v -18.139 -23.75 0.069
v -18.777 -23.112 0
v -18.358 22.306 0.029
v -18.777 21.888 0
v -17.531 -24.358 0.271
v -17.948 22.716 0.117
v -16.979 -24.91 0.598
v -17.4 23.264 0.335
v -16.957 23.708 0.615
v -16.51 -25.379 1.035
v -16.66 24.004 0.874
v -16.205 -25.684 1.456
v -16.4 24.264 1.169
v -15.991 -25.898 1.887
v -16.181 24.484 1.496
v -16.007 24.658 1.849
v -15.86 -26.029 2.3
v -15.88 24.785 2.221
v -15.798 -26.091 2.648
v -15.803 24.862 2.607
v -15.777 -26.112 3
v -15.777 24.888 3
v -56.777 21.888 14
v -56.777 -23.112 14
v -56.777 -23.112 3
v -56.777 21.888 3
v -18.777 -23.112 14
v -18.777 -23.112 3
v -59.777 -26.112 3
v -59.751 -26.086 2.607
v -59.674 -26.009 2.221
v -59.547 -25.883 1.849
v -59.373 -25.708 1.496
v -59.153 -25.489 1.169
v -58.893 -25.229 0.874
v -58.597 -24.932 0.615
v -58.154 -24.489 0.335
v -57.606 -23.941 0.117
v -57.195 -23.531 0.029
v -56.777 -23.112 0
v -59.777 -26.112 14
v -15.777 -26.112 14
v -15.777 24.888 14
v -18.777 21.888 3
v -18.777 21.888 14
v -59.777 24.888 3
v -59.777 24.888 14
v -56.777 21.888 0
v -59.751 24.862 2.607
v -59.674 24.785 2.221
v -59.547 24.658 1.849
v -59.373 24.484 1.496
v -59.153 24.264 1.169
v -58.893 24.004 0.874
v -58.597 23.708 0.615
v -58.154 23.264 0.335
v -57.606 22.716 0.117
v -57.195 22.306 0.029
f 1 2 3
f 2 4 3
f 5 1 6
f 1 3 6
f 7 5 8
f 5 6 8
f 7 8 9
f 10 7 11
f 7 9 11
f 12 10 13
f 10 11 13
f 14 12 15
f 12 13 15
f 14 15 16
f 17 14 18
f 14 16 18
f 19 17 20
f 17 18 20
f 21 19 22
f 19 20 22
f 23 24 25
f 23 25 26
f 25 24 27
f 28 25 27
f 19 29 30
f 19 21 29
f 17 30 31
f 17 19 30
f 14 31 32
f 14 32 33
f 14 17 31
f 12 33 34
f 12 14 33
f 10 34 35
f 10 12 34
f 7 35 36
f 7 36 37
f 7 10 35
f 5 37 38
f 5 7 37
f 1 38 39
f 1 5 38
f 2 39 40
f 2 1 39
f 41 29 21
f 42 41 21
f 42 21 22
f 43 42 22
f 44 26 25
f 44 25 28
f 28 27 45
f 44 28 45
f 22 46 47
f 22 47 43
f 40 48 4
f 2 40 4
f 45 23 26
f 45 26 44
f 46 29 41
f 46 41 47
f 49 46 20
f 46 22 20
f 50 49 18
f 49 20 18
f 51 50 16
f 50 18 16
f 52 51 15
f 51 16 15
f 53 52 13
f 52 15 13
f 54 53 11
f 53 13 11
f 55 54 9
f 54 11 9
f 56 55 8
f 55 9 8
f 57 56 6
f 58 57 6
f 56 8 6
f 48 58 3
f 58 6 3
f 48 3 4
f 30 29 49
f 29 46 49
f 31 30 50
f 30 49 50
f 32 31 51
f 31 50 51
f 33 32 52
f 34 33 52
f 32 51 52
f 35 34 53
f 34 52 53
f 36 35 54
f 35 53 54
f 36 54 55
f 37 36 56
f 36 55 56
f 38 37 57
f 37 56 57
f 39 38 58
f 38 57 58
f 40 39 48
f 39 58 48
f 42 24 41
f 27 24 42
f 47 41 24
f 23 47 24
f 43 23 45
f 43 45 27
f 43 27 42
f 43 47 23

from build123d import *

# Parameters (mm, degrees)
SKETCH_1_W          = 44
SKETCH_1_H          = 51
EXTRUDE_2_DEPTH     = 14
SKETCH_2_W          = 38
SKETCH_2_H          = 45
CUT_EXTRUDE_1_DEPTH = 11
FILLET_1_R          = 3


with BuildPart() as part:
    # 草圖1 → 填料-伸長2 (new body)
    with BuildSketch(Plane.XY):
        with Locations((-37.776876722, -0.612244898)):
            Rectangle(SKETCH_1_W, SKETCH_1_H)
    extrude(amount=EXTRUDE_2_DEPTH)

    # 草圖2 → 除料-伸長1 (cut)
    with BuildSketch(Plane.XY.offset(14)):
        with Locations((-37.776876722, -0.612244898)):
            Rectangle(SKETCH_2_W, SKETCH_2_H)
    extrude(amount=-CUT_EXTRUDE_1_DEPTH, mode=Mode.SUBTRACT)

    # 圓角1
    fillet_1_edges = [part.edges().sort_by_distance(p)[0] for p in [
        (-37.776876722, 24.887755102, 0),
        (-15.776876722, -0.612244898, 0),
        (-37.776876722, -26.112244898, 0),
        (-59.776876722, -0.612244898, 0),
    ]]
    fillet(fillet_1_edges, radius=FILLET_1_R)


solid = part.part
